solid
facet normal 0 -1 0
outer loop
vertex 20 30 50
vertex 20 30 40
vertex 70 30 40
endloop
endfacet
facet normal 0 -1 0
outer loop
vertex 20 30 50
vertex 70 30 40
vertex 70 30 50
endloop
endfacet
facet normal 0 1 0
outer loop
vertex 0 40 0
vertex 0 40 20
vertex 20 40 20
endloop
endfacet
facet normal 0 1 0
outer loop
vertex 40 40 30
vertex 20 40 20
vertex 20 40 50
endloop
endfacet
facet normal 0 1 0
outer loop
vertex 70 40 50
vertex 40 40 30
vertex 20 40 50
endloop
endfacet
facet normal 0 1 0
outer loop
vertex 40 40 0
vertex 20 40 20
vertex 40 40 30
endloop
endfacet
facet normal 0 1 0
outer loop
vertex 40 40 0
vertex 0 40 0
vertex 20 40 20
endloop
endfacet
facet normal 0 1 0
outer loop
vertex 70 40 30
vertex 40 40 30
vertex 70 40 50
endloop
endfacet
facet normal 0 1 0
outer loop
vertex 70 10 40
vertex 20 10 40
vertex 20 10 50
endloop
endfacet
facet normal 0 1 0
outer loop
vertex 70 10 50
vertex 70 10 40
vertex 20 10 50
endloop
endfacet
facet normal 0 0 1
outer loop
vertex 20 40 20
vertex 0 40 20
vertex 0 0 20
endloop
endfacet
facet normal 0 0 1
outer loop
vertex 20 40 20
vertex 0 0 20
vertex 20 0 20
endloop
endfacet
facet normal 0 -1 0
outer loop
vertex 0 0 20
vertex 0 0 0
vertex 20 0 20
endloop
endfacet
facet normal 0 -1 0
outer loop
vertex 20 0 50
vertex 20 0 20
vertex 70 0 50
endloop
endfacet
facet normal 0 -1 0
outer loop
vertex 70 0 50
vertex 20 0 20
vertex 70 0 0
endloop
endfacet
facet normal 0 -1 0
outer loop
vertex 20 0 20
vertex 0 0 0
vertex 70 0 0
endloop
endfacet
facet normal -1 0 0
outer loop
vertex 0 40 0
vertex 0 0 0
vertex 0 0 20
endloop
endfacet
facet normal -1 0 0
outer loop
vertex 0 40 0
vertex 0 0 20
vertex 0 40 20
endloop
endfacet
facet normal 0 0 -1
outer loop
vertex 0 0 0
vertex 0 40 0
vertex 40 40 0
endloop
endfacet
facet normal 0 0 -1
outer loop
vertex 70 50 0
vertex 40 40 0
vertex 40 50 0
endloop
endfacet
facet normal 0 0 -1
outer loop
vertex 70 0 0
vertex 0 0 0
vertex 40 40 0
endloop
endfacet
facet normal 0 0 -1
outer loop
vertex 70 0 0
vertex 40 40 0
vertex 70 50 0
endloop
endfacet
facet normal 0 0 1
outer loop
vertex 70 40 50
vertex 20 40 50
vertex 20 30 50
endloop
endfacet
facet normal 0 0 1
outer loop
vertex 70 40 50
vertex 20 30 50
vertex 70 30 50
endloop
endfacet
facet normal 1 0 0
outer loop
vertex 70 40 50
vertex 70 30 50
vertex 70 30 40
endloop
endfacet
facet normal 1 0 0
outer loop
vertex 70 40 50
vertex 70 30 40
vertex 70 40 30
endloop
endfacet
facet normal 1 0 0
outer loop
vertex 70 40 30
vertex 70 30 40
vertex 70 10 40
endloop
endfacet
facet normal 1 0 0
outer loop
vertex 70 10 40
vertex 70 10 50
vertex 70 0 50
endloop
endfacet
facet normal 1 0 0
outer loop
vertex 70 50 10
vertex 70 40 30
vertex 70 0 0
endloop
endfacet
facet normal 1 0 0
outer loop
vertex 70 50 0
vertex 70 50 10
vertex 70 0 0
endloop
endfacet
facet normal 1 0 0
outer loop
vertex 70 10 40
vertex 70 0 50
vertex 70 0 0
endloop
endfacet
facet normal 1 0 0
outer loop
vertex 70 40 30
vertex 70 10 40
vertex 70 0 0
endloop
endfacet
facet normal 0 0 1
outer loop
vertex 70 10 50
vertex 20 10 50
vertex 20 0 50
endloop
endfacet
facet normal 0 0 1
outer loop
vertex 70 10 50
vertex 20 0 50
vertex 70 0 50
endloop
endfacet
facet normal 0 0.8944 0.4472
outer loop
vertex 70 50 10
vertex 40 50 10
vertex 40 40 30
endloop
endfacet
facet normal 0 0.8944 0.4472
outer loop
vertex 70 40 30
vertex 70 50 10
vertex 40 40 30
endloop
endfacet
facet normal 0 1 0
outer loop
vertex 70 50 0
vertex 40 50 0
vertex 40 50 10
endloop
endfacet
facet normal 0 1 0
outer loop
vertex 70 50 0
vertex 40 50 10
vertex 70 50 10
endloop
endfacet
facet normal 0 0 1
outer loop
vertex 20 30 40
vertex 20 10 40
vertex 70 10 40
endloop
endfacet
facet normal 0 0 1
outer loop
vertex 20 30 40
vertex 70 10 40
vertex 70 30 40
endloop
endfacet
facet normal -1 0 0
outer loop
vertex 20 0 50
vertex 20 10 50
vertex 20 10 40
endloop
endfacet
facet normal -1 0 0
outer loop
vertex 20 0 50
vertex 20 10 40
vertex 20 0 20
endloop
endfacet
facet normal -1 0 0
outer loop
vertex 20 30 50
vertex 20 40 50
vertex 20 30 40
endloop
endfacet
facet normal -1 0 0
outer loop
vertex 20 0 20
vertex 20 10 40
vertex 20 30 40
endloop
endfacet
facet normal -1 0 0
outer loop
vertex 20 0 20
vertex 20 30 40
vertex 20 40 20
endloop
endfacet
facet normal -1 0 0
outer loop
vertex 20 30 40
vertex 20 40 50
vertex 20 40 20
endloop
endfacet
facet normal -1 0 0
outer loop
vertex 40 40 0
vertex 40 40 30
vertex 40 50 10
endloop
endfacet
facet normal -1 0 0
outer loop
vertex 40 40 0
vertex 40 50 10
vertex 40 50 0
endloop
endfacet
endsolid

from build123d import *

# Parameters (mm, degrees)
SKETCH1_W           = 70
SKETCH1_H           = 40
BOSS_EXTRUDE1_DEPTH = 50
SKETCH2_W           = 20
SKETCH2_H           = 30
CUT_EXTRUDE1_DEPTH  = 50
SKETCH3_W           = 10
SKETCH3_H           = 20
CUT_EXTRUDE2_DEPTH  = 50
SKETCH4_W           = 30
SKETCH4_H           = 30
BOSS_EXTRUDE2_DEPTH = 10
CUT_EXTRUDE3_DEPTH  = 56


with BuildPart() as part:
    # Sketch1 → Boss-Extrude1 (new body)
    with BuildSketch(Plane.XY):
        with Locations((35, 20)):
            Rectangle(SKETCH1_W, SKETCH1_H)
    extrude(amount=BOSS_EXTRUDE1_DEPTH)

    # Sketch2 → Cut-Extrude1 (cut)
    with BuildSketch(Plane(origin=(0, 40, 0), x_dir=(1, 0, 0), z_dir=(0, 1, 0))):
        with Locations((10, -35)):
            Rectangle(SKETCH2_W, SKETCH2_H)
    extrude(amount=-CUT_EXTRUDE1_DEPTH, mode=Mode.SUBTRACT)

    # Sketch3 → Cut-Extrude2 (cut)
    with BuildSketch(Plane.ZY.offset(-20)):
        with Locations((45, 20)):
            Rectangle(SKETCH3_W, SKETCH3_H)
    extrude(amount=-CUT_EXTRUDE2_DEPTH, mode=Mode.SUBTRACT)

    # Sketch4 → Boss-Extrude2 (add)
    with BuildSketch(Plane(origin=(0, 40, 0), x_dir=(1, 0, 0), z_dir=(0, 1, 0))):
        with Locations((55, -15)):
            Rectangle(SKETCH4_W, SKETCH4_H)
    extrude(amount=BOSS_EXTRUDE2_DEPTH)

    # Sketch5 → Cut-Extrude3 (cut)
    with BuildSketch(Plane.ZY.offset(-40)):
        Polygon((10, 50), (30, 40), (30, 50), align=None)
    extrude(amount=-CUT_EXTRUDE3_DEPTH, mode=Mode.SUBTRACT)


solid = part.part
